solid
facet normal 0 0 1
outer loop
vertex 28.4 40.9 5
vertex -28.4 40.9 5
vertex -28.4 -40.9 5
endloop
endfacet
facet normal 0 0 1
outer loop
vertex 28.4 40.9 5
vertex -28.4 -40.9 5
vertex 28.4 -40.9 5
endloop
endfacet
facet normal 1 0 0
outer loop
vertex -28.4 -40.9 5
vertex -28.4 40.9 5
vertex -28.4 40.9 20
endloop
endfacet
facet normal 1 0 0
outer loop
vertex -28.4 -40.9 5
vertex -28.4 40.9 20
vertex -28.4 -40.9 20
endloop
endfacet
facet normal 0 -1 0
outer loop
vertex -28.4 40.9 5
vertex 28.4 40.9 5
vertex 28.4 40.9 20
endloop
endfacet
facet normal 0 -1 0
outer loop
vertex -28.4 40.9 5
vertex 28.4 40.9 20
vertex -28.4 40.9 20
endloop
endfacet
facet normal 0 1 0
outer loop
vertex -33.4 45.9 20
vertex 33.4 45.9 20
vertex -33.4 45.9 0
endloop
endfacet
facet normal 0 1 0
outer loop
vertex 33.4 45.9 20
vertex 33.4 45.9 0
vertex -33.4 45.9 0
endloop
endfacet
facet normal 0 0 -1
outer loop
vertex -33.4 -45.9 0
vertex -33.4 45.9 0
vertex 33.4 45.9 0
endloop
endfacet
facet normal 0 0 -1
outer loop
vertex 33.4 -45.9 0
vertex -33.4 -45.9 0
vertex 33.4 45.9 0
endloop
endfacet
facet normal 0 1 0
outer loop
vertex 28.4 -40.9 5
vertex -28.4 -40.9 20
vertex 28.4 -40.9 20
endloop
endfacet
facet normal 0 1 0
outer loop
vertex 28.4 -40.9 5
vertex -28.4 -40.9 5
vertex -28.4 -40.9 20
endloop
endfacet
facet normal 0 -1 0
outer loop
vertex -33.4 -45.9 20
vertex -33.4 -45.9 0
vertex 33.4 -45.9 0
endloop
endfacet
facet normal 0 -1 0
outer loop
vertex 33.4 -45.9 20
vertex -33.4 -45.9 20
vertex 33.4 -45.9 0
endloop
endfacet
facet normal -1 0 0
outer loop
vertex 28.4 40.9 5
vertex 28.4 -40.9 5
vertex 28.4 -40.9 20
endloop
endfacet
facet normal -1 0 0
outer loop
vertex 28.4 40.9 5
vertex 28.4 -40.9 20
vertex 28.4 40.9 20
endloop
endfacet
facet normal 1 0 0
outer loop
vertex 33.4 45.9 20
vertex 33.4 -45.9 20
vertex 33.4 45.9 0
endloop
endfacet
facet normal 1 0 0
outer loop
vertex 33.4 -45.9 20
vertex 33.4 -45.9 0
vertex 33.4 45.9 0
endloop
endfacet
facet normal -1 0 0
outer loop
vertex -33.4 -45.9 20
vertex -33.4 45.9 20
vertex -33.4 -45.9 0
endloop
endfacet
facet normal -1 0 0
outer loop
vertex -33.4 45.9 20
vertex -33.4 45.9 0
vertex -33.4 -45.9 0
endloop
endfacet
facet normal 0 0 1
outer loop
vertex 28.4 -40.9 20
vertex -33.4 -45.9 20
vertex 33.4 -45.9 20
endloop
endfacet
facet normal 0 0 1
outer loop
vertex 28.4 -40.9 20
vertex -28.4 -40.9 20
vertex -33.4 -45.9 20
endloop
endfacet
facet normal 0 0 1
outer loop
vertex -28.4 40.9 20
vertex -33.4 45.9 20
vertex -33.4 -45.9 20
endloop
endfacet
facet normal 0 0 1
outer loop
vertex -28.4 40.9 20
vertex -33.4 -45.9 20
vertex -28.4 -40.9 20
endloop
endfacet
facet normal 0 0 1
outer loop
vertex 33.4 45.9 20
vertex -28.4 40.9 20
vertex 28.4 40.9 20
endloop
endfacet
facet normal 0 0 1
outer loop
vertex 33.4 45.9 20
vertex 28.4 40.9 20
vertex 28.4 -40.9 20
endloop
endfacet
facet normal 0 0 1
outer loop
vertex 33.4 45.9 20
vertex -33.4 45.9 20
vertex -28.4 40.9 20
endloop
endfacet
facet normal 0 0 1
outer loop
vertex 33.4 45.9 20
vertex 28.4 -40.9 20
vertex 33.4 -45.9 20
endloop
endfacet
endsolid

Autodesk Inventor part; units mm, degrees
ref_plane "YZ Plane" through (0, 0, 0) normal (1, 0, 0) x (0, 1, 0)
ref_plane "XZ Plane" through (0, 0, 0) normal (0, 1, 0) x (-1, 0, 0)
ref_plane "XY Plane" through (0, 0, 0) normal (0, 0, 1) x (1, 0, 0)
ref_plane "Arbeitsebene1" through (0, 0, 0) normal (0, 0, 1) x (1, 0, 0)
sketch "Skizze1" plane through (0, 0, 0) normal (0, 0, 1) x (1, 0, 0)
  line L0 (-33.9, 46.4) -> (-33.9, -46.4) projected
  line L1 (-33.9, -46.4) -> (33.9, -46.4) projected
  line L2 (33.9, -46.4) -> (33.9, 46.4) projected
  line L3 (33.9, 46.4) -> (-33.9, 46.4) projected
  line L4 (-33.4, 45.9) -> (-33.4, -45.9)
  line L5 (-33.4, -45.9) -> (33.4, -45.9)
  line L6 (33.4, -45.9) -> (33.4, 45.9)
  line L7 (33.4, 45.9) -> (-33.4, 45.9)
  point P0 (0, 0)
  dimension "d0" = 0.5
extrude "Extrusion1" add sketch "Skizze1" along normal blind 5 contours L7 L6 L5 L4
sketch "Skizze2" plane through (0, 0, 5) normal (0, 0, 1) x (1, 0, 0)
  line L0 (-33.4, 45.9) -> (-33.4, -45.9) projected
  line L1 (-33.4, -45.9) -> (33.4, -45.9) projected
  line L2 (33.4, -45.9) -> (33.4, 45.9) projected
  line L3 (33.4, 45.9) -> (-33.4, 45.9) projected
  line L4 (-28.4, 40.9) -> (-28.4, -40.9)
  line L5 (-28.4, -40.9) -> (28.4, -40.9)
  line L6 (28.4, -40.9) -> (28.4, 40.9)
  line L7 (28.4, 40.9) -> (-28.4, 40.9)
  point P0 (0, 0)
  dimension "d3" = 5
extrude "Extrusion2" add sketch "Skizze2" along normal blind 15
properties part number "InlayUnten" material "Kautschuk"
